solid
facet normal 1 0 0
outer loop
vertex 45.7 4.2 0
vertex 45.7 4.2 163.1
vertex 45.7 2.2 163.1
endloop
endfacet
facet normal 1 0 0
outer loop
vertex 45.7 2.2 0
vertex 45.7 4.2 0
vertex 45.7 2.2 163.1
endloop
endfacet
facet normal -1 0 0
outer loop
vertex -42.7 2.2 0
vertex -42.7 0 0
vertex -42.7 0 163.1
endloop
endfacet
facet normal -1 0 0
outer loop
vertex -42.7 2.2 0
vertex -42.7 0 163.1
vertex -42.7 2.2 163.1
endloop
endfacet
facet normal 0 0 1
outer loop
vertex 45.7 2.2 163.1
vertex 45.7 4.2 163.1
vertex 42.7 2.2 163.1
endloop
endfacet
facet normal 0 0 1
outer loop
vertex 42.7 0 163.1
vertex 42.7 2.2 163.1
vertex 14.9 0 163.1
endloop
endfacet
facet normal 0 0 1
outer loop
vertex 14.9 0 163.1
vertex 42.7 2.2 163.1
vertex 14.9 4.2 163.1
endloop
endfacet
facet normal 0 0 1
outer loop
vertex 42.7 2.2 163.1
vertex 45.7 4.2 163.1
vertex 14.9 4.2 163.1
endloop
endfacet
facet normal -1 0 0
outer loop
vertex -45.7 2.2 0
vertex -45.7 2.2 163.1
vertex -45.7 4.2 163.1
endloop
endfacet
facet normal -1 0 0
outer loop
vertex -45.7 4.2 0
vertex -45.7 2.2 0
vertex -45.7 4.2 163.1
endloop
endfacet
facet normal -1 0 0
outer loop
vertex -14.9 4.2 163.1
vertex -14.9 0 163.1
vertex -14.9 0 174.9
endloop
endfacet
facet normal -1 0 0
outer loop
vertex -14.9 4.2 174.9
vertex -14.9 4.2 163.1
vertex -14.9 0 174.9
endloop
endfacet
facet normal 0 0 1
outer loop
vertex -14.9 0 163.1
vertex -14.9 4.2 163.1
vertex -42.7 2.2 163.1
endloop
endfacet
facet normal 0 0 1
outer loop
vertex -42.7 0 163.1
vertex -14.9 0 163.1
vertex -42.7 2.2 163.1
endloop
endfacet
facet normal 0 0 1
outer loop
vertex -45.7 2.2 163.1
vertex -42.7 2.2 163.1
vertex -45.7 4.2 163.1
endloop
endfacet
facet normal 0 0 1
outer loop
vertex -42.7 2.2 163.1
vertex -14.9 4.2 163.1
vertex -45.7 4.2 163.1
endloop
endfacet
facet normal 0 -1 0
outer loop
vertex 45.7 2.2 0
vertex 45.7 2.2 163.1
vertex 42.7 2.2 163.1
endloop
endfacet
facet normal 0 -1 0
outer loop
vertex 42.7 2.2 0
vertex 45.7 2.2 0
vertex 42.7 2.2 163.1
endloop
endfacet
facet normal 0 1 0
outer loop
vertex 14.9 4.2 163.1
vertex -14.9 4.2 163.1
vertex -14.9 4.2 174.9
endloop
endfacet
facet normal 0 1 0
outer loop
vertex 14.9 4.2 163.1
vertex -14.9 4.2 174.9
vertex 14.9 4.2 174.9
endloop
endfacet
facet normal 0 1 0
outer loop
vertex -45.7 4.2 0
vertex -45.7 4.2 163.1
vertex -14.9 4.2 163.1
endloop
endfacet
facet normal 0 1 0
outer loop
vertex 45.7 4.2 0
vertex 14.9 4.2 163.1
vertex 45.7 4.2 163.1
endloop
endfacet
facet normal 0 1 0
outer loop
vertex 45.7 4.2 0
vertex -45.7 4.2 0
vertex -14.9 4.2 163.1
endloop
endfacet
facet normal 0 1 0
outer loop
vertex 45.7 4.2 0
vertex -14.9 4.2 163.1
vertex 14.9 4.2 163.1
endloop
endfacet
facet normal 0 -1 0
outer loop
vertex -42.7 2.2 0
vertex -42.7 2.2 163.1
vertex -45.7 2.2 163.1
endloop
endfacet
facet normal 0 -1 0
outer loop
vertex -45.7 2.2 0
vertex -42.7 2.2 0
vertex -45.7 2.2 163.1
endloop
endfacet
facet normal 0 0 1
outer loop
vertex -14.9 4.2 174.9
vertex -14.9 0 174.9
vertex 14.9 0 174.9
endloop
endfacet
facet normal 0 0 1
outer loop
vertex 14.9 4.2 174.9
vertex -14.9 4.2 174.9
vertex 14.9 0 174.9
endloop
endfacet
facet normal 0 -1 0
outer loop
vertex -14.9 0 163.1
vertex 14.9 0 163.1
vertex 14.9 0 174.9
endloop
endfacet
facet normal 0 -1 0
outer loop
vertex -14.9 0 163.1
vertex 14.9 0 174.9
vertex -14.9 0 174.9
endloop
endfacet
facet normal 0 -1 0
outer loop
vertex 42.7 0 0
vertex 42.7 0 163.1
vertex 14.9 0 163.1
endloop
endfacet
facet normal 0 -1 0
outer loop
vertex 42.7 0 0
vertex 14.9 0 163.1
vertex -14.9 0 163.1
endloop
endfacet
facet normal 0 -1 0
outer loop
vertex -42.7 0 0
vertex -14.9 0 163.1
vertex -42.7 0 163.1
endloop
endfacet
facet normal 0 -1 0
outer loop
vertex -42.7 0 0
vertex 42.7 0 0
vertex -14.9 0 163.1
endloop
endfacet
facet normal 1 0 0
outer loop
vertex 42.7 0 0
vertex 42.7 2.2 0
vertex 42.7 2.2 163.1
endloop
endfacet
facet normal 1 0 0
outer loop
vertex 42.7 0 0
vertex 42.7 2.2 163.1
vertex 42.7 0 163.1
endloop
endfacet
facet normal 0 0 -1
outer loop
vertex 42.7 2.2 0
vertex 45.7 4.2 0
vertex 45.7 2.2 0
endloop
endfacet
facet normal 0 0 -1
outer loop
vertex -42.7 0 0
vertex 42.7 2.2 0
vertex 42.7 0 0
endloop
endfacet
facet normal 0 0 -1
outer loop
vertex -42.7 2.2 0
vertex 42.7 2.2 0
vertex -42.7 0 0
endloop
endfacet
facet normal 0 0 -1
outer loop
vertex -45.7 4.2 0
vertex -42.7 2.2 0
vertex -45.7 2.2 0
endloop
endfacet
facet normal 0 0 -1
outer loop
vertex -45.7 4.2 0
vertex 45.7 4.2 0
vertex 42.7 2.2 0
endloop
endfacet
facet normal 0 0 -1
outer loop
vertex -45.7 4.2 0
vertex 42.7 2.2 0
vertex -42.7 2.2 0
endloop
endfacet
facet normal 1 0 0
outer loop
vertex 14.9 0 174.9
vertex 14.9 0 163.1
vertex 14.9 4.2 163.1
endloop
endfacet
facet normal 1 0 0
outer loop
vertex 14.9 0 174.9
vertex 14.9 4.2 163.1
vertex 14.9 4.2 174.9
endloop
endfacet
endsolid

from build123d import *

# Parameters (mm, degrees)
BOSS_EXTRUDE1_DEPTH = 163.1
SKETCH3_W           = 29.8
SKETCH3_H           = 11.8
BOSS_EXTRUDE2_DEPTH = 4.2


with BuildPart() as part:
    # Sketch2 → Boss-Extrude1 (new body)
    with BuildSketch(Plane.XY):
        Polygon((42.7, 0), (-42.7, 0), (-42.7, 2.2), (-45.7, 2.2), (-45.7, 4.2), (45.7, 4.2), (45.7, 2.2), (42.7, 2.2), align=None)
    extrude(amount=BOSS_EXTRUDE1_DEPTH)

    # Sketch3 → Boss-Extrude2 (add)
    with BuildSketch(Plane.XZ):
        with Locations((0, 169)):
            Rectangle(SKETCH3_W, SKETCH3_H)
    extrude(amount=-BOSS_EXTRUDE2_DEPTH)


solid = part.part
